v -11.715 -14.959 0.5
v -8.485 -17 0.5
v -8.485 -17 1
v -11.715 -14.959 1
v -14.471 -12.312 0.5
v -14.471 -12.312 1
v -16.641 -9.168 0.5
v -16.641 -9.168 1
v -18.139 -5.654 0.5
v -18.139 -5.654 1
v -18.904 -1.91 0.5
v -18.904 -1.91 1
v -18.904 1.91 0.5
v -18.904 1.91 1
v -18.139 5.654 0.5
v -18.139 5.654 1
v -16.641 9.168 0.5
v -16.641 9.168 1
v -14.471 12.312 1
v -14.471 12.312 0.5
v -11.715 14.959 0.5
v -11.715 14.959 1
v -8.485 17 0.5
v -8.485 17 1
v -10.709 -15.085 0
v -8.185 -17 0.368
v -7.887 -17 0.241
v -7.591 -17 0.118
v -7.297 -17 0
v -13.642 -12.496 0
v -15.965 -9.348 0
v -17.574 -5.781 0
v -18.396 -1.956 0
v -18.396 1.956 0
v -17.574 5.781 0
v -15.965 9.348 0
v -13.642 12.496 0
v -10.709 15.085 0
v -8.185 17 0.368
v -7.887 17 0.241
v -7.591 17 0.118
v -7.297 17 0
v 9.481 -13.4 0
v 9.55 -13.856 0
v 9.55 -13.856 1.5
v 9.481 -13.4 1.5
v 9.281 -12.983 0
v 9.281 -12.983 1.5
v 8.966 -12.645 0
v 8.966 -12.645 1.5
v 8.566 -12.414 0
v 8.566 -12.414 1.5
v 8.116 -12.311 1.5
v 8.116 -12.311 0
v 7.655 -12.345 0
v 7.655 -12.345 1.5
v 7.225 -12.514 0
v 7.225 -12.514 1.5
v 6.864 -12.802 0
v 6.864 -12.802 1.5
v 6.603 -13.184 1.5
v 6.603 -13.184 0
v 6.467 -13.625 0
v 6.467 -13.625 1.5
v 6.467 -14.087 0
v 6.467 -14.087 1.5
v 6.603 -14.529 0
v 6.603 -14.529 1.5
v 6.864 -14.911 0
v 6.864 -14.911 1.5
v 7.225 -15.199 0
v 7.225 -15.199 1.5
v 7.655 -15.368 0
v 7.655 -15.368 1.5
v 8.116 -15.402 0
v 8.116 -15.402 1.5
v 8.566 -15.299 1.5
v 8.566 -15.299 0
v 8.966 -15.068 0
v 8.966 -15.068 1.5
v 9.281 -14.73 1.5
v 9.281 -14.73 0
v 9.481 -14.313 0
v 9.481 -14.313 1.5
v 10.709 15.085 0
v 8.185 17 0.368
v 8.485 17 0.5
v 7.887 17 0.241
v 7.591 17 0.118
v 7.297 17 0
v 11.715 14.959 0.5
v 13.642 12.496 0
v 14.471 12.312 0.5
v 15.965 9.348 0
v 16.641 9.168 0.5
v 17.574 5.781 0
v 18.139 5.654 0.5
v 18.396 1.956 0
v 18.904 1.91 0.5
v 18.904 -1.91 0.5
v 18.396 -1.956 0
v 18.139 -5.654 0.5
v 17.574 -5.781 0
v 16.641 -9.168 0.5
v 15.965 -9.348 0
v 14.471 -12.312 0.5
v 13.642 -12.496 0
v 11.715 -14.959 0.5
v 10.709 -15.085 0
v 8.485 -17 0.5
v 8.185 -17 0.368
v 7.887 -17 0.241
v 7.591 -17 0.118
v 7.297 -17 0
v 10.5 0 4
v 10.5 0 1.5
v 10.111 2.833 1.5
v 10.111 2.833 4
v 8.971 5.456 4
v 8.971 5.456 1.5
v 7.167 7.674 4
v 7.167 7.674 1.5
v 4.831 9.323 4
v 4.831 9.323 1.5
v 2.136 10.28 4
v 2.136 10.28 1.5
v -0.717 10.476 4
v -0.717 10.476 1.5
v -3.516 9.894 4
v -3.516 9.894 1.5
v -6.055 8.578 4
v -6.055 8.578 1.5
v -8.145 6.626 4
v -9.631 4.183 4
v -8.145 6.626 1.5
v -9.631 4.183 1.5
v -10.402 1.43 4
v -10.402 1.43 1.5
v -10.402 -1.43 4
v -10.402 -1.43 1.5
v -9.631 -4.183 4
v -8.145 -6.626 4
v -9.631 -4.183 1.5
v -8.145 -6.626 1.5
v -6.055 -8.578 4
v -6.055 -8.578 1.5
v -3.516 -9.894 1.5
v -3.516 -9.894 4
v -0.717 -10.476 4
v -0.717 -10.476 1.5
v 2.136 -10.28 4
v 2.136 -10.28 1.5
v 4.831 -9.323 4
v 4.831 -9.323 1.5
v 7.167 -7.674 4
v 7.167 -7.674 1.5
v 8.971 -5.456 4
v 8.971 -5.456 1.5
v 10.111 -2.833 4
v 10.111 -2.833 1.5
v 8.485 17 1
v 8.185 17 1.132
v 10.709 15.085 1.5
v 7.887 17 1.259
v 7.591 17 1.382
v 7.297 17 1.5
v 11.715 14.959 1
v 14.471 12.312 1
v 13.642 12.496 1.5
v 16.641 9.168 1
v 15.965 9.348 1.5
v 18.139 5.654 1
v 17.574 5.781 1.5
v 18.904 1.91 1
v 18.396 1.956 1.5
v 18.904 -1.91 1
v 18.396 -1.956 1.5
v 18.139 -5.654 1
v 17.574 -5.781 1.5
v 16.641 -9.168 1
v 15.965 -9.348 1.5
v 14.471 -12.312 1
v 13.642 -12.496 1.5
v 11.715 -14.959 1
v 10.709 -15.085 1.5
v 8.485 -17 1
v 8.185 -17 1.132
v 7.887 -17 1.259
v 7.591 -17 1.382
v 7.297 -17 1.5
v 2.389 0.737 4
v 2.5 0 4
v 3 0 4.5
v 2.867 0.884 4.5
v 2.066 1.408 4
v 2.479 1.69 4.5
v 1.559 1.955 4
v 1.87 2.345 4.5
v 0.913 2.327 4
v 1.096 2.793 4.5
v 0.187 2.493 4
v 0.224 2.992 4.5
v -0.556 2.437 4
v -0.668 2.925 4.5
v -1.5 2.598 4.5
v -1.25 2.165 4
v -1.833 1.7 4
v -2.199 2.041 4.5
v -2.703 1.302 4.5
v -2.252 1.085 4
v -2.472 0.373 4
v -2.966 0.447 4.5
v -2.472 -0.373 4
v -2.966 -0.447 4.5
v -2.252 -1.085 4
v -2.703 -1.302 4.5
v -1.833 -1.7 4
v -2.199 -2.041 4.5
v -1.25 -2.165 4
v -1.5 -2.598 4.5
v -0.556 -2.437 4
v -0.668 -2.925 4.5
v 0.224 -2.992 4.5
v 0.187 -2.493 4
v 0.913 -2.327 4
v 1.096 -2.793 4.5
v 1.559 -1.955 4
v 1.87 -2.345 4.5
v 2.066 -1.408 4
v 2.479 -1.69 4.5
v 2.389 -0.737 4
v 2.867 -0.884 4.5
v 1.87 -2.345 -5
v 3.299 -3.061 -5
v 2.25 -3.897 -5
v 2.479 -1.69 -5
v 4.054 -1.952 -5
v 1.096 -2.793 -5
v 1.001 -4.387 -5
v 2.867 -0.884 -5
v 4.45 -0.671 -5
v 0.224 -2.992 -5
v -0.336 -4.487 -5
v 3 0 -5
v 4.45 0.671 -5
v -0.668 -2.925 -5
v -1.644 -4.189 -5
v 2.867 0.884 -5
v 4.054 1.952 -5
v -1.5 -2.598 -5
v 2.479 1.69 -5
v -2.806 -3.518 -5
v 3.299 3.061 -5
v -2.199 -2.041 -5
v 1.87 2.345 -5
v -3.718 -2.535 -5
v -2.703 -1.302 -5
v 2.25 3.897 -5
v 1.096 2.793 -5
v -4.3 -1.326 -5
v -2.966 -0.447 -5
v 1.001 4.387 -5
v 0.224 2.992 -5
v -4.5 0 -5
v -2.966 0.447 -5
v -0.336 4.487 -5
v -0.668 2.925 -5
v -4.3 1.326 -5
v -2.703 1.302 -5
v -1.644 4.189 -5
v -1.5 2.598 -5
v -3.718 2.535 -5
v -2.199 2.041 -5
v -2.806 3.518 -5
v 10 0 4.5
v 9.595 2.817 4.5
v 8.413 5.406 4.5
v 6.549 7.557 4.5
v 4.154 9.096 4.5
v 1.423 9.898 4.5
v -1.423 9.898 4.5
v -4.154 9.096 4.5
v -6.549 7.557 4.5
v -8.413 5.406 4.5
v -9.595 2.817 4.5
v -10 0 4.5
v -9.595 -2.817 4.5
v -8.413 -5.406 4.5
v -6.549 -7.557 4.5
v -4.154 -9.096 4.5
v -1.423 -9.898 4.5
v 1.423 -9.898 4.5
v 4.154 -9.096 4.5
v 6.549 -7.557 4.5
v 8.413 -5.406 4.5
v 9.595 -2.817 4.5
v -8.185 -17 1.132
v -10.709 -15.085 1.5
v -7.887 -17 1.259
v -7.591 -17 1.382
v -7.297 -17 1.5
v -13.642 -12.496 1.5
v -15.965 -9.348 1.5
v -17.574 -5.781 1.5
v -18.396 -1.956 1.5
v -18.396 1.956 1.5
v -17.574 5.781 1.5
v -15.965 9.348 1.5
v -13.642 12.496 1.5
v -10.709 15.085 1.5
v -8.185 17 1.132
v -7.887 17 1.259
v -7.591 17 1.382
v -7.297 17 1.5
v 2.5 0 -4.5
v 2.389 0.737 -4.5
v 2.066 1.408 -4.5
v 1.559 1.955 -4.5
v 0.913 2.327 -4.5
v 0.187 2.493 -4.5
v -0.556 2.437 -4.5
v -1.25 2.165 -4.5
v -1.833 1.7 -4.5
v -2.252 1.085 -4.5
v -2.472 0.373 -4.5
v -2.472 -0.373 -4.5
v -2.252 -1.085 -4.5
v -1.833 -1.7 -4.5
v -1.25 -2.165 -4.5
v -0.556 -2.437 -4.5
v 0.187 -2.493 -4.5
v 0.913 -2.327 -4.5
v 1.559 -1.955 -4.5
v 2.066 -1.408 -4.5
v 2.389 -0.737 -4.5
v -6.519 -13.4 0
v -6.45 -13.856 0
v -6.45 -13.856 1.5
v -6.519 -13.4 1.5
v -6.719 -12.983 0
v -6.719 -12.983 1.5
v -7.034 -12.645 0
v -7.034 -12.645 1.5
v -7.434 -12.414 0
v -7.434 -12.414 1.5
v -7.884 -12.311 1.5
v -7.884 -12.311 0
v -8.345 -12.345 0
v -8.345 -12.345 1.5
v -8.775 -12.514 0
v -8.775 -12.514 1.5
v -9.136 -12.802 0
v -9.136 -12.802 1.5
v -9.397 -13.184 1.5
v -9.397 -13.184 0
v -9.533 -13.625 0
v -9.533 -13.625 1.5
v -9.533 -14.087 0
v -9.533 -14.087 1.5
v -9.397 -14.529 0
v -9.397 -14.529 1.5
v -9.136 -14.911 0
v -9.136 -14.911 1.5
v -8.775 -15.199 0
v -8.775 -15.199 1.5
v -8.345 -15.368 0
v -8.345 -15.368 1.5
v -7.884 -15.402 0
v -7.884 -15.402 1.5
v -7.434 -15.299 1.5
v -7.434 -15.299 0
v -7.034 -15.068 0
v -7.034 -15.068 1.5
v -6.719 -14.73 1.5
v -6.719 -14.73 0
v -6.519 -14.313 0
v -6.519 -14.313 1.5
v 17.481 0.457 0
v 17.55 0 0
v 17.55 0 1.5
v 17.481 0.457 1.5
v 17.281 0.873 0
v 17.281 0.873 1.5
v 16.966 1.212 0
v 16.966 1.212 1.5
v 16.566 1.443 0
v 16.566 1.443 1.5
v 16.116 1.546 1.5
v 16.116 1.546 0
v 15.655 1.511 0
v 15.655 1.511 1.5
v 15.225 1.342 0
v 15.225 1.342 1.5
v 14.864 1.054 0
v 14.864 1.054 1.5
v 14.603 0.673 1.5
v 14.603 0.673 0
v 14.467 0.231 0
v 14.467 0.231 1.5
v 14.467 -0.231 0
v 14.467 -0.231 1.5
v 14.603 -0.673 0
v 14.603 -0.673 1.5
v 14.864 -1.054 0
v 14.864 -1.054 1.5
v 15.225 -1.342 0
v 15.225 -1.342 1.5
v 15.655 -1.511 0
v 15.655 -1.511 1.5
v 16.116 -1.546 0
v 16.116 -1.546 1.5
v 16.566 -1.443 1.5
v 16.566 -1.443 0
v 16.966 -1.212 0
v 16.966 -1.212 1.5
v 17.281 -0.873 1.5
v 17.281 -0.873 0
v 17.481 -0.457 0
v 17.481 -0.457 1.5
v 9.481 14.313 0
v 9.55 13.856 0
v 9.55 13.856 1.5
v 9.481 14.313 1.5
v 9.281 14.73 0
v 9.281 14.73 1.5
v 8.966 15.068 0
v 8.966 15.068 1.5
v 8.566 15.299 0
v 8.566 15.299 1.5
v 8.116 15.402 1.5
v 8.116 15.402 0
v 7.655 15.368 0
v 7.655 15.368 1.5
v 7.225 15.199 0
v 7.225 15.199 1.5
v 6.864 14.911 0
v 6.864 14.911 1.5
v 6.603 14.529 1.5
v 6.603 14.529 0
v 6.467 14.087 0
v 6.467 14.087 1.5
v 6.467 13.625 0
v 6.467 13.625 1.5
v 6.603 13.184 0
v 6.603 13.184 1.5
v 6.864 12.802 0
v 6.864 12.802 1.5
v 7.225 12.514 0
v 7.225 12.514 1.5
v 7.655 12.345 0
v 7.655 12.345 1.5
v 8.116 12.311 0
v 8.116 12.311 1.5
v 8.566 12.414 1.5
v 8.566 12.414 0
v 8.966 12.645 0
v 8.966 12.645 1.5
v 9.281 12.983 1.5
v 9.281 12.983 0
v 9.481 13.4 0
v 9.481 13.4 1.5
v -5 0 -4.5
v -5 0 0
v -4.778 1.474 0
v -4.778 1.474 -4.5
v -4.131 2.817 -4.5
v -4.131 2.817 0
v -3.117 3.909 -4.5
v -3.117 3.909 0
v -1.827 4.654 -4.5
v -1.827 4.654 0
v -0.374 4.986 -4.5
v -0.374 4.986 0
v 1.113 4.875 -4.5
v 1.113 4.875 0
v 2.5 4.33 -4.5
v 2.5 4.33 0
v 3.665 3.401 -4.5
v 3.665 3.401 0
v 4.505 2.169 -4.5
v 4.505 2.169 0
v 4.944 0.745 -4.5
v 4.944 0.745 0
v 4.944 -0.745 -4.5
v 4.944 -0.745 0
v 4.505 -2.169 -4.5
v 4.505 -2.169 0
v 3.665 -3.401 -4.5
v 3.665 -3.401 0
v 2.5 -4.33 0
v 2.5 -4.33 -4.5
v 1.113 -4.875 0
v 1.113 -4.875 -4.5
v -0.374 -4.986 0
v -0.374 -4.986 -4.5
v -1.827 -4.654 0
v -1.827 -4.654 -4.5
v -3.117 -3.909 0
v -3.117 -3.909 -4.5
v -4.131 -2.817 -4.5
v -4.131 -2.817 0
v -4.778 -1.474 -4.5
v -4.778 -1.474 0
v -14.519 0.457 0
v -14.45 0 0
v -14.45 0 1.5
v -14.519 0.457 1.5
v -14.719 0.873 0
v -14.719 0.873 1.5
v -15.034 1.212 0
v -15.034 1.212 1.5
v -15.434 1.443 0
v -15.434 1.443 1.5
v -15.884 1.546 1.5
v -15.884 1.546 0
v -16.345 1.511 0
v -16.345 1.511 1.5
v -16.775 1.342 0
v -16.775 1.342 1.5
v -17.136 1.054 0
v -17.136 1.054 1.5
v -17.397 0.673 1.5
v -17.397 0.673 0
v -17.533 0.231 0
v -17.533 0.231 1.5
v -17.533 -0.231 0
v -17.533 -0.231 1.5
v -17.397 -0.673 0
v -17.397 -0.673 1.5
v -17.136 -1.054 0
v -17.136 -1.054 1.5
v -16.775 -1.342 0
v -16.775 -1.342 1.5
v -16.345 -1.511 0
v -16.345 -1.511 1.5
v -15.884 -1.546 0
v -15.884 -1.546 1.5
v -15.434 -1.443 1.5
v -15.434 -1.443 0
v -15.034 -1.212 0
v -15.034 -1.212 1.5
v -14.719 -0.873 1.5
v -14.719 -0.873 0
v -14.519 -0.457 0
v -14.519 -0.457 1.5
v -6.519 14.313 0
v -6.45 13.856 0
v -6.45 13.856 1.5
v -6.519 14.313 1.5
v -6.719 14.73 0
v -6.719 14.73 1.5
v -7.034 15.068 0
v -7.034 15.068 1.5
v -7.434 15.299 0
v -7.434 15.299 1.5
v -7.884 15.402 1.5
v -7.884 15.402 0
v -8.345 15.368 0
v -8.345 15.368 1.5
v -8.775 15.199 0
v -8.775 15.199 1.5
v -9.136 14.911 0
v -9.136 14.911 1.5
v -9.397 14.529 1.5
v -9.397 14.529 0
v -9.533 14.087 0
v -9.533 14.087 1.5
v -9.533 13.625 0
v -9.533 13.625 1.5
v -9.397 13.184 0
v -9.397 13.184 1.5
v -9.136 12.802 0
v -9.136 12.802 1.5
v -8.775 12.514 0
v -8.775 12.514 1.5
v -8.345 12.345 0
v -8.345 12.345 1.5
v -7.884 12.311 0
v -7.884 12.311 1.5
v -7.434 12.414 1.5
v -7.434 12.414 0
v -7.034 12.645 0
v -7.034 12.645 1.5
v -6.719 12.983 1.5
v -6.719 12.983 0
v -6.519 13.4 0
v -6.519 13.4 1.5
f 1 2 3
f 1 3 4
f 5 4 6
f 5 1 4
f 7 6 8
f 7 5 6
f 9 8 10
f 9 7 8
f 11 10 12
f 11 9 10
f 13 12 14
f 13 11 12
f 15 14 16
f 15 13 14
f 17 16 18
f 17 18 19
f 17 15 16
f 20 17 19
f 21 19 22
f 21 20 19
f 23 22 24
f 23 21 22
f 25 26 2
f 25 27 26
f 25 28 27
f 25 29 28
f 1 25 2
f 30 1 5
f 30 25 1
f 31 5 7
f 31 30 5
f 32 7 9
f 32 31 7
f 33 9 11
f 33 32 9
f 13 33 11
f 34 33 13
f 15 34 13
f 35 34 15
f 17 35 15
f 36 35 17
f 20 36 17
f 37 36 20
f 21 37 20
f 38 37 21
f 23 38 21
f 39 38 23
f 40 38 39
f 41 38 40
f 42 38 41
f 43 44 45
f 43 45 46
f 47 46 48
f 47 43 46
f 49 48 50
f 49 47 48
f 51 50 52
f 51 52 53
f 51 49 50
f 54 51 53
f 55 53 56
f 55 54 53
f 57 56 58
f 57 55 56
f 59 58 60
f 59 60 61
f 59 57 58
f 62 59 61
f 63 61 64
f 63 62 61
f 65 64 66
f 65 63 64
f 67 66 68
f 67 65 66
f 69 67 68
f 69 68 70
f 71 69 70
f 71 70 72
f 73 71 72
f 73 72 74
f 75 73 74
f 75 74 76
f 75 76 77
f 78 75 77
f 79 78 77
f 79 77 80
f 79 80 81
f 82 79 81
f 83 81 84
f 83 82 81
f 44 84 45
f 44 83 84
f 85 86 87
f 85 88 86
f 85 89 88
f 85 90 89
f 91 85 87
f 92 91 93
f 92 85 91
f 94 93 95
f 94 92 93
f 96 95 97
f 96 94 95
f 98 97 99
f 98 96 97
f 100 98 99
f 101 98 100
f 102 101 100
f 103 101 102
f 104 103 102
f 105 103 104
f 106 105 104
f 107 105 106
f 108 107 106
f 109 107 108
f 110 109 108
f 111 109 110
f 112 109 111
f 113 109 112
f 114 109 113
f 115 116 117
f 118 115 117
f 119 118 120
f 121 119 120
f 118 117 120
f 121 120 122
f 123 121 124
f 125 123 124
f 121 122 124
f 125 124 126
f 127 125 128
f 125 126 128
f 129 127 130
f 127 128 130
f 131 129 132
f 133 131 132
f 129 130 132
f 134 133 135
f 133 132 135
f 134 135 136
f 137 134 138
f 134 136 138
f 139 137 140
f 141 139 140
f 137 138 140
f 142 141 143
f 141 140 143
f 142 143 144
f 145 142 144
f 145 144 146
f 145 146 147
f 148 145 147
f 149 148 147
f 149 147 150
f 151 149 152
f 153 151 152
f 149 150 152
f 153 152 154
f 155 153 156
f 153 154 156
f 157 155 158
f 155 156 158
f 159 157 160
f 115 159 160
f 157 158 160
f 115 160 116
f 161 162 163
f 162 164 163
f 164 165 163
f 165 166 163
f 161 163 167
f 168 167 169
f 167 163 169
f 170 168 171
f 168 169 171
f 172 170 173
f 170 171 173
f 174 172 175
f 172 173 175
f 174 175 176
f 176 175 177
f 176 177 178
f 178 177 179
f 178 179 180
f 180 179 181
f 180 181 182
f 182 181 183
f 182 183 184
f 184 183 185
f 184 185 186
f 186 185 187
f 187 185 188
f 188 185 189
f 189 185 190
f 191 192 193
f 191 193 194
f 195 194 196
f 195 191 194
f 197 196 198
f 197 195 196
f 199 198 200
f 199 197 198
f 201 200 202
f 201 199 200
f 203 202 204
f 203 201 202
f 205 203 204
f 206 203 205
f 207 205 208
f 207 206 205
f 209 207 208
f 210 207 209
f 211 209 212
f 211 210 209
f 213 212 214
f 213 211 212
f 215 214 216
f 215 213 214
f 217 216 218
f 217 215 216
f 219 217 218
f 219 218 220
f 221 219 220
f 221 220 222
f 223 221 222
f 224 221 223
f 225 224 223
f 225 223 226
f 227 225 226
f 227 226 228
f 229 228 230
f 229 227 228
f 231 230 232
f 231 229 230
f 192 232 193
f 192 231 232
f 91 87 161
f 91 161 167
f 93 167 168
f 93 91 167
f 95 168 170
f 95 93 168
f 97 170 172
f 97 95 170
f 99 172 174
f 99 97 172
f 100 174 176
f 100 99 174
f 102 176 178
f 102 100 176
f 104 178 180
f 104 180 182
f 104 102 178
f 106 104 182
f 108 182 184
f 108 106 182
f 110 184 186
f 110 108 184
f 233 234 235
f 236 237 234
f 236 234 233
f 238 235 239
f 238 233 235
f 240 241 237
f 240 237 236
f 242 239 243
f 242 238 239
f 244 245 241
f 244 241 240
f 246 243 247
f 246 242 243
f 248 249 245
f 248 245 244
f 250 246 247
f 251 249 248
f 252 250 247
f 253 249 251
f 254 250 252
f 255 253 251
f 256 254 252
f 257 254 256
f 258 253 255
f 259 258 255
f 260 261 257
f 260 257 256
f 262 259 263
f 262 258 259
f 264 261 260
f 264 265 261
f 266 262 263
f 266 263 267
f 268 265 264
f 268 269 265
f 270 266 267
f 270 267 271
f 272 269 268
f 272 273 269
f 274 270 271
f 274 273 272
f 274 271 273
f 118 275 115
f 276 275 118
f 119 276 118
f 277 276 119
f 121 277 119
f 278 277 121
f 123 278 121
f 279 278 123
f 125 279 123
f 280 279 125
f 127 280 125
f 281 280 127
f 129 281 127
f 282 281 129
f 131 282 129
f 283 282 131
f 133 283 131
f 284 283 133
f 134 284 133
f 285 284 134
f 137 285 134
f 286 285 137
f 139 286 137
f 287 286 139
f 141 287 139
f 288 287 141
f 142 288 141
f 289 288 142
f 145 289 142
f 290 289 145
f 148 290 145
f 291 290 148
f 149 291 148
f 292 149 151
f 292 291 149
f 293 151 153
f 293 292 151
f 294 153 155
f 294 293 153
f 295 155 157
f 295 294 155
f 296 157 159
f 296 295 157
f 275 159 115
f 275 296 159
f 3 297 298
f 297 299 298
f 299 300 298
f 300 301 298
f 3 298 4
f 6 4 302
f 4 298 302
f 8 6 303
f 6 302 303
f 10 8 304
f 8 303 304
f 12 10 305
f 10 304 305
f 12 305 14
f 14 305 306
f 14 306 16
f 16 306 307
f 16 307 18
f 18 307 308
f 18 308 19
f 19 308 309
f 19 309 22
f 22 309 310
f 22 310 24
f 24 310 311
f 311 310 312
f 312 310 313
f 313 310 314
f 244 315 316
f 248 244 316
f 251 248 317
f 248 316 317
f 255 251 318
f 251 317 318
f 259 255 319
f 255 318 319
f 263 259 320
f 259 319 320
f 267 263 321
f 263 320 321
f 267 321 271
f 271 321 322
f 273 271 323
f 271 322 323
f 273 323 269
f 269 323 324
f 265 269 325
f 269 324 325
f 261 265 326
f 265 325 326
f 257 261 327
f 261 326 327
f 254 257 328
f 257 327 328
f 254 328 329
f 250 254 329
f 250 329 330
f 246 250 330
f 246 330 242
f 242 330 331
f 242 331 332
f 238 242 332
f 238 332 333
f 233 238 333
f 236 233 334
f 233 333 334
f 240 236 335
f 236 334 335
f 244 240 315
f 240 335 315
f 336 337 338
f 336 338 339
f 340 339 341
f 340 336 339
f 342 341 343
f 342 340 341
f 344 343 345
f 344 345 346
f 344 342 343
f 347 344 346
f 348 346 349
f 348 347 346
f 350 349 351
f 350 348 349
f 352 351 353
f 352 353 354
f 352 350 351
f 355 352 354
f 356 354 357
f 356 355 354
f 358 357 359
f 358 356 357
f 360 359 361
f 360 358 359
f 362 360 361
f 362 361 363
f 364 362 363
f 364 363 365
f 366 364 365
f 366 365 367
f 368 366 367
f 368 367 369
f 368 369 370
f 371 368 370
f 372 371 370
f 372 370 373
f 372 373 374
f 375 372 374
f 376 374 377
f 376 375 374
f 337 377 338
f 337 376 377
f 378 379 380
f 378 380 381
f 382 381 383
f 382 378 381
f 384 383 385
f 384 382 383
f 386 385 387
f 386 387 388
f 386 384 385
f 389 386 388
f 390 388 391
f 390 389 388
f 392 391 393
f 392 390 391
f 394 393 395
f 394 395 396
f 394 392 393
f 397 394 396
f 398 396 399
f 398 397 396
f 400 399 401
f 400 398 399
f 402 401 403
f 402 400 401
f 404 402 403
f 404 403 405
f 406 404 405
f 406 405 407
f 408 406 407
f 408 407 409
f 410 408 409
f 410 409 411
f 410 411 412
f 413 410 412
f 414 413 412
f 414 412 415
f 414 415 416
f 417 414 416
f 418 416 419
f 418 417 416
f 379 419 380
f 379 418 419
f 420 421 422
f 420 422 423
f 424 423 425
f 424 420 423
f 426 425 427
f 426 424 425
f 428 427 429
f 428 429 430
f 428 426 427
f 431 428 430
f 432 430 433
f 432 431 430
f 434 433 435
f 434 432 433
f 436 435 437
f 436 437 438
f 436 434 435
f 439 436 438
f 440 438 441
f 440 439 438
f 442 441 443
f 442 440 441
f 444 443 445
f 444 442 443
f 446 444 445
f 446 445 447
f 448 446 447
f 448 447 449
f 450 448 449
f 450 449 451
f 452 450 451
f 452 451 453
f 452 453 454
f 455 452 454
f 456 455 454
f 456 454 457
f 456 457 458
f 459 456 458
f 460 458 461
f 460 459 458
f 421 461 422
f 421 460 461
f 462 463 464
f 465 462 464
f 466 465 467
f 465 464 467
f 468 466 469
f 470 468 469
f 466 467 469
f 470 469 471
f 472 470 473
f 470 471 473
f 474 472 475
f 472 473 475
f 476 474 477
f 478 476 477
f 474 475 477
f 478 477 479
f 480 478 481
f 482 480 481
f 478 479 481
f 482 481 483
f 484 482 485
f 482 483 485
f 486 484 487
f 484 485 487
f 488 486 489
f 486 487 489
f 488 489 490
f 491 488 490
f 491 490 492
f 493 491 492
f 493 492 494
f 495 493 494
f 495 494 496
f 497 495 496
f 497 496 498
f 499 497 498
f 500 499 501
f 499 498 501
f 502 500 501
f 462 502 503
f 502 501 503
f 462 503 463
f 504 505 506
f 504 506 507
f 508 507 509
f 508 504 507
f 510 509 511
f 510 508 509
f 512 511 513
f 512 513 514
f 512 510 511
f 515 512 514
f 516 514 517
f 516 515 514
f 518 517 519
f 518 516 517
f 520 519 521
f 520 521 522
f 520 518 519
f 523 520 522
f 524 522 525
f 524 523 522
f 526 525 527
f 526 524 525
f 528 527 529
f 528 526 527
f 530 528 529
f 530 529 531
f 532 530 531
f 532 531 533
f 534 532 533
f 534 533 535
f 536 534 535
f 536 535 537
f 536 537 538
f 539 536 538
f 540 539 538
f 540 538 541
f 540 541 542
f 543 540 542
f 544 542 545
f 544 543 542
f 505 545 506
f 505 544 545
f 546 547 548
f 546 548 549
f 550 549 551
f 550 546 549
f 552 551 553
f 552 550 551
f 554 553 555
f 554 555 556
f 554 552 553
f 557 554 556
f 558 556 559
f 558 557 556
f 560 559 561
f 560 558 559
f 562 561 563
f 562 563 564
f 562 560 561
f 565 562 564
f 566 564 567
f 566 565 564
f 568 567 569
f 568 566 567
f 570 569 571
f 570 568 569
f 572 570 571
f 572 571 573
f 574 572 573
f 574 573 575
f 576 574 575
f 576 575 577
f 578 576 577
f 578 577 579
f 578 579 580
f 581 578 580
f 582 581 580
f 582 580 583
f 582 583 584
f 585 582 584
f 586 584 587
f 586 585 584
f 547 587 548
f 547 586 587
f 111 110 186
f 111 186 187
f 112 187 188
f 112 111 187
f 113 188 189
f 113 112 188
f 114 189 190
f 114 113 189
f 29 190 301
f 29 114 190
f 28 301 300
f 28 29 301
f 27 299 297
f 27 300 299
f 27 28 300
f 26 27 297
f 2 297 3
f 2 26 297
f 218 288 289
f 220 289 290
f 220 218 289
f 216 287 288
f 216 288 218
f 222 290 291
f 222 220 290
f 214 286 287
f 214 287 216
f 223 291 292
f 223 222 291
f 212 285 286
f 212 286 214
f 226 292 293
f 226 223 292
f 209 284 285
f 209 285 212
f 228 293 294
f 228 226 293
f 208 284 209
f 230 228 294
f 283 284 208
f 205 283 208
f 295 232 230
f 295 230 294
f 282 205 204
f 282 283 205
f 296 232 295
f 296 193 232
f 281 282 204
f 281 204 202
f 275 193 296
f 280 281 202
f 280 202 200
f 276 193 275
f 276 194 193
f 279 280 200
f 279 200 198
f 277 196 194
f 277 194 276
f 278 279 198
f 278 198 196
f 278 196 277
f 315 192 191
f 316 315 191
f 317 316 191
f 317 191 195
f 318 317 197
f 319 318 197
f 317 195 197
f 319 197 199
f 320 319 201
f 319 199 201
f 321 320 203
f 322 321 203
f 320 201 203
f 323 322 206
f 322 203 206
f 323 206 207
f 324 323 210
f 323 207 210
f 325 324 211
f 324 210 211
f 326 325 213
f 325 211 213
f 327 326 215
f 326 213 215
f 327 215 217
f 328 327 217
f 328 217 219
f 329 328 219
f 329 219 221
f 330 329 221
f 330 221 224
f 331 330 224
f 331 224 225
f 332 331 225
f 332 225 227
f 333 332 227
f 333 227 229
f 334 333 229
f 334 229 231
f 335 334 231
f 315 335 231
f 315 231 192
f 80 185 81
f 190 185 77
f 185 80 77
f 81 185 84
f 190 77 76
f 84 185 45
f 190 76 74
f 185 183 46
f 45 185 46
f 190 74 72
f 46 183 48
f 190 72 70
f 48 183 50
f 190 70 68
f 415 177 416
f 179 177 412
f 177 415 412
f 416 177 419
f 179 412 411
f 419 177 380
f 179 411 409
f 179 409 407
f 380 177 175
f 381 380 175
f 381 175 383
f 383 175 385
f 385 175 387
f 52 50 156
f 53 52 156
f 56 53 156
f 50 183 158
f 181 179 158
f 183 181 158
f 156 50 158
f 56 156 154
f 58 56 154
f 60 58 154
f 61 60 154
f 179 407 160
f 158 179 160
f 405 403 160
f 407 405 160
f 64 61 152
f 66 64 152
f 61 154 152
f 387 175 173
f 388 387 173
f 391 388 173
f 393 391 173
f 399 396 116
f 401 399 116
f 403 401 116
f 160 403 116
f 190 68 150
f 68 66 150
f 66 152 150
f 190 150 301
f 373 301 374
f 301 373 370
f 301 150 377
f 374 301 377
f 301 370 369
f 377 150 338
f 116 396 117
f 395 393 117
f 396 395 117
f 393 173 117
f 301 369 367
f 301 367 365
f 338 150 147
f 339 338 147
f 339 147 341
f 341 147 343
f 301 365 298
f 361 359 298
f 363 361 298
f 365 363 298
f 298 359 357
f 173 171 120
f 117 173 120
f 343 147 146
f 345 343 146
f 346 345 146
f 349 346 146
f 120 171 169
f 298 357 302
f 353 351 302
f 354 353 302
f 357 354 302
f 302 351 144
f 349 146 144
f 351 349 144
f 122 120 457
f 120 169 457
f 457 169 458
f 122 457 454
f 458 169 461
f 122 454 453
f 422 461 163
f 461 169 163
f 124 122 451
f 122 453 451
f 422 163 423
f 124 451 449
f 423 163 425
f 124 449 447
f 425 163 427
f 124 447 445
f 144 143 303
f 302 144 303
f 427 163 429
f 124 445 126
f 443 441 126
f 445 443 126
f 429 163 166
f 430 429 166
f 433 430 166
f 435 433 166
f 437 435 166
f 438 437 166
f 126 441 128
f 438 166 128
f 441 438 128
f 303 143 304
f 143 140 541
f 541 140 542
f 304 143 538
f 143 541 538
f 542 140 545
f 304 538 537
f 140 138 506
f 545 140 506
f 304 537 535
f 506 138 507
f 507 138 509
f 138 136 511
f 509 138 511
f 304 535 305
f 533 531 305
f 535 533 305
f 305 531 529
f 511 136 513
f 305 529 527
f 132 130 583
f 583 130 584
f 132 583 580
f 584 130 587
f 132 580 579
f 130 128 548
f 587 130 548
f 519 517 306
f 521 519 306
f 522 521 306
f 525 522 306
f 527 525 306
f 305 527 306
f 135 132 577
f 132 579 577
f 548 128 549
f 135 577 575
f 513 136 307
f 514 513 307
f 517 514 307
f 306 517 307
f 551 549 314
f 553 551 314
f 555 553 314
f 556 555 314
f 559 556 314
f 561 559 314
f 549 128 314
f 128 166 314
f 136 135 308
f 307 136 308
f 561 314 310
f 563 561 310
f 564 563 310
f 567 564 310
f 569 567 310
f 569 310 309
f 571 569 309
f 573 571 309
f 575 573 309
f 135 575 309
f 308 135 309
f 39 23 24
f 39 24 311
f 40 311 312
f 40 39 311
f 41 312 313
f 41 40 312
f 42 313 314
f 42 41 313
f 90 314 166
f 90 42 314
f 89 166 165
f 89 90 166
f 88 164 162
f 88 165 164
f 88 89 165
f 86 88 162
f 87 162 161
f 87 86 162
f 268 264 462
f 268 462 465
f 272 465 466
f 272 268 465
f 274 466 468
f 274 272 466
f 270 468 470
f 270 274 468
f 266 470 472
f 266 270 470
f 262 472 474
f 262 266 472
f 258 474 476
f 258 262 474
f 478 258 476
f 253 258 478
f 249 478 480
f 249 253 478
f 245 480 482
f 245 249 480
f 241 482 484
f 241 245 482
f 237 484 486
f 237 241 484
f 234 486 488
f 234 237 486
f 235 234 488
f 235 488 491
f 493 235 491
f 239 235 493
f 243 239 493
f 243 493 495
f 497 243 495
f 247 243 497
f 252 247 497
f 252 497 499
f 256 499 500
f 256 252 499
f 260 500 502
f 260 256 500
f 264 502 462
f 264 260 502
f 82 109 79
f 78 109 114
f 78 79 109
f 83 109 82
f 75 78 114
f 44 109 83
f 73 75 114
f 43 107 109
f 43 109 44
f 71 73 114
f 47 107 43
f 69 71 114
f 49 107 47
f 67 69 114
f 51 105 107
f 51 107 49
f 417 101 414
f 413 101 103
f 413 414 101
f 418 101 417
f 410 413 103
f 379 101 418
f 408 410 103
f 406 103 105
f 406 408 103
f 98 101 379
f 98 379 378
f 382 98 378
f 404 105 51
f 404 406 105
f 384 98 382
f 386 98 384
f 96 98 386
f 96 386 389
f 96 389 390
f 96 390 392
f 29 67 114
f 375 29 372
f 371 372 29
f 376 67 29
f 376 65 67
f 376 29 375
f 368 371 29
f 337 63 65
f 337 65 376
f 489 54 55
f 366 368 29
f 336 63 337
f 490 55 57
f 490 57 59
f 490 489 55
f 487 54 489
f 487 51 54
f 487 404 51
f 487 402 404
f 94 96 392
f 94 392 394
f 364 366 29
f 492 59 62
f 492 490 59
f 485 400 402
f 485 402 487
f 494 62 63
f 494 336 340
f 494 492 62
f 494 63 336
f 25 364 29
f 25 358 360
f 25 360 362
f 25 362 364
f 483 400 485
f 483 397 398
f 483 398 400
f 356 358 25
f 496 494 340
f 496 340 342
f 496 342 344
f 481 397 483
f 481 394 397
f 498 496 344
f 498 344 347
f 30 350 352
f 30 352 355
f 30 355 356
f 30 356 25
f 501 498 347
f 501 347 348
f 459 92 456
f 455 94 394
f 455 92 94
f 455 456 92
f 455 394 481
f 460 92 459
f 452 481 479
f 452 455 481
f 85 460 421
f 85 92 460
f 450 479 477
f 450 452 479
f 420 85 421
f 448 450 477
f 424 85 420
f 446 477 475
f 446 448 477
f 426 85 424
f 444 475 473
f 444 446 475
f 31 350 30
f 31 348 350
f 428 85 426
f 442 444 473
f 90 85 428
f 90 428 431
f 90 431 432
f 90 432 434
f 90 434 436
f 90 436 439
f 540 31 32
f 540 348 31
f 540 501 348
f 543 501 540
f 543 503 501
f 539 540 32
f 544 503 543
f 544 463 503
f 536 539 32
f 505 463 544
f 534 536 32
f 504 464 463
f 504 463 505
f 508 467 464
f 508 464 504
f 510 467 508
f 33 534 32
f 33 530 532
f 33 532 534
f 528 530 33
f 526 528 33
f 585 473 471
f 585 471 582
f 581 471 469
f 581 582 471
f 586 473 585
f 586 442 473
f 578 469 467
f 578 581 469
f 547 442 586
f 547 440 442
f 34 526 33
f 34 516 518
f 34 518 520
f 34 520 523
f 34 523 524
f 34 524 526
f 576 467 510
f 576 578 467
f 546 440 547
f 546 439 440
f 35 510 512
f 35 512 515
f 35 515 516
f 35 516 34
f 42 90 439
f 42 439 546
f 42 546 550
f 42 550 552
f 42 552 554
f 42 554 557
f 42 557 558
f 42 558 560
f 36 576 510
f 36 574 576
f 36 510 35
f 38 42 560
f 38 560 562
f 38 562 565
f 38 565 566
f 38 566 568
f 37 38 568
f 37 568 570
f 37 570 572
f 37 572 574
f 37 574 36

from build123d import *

# Parameters (mm, degrees)
SKETCH2_R           = 1.55
BOSS_EXTRUDE1_DEPTH = 1.5
SKETCH3_R           = 10.5
BOSS_EXTRUDE2_DEPTH = 3
SKETCH4_R           = 5
BOSS_EXTRUDE3_DEPTH = 5
SKETCH5_R           = 2.5
CUT_EXTRUDE1_DEPTH  = 28.207535721
CHAMFER1_SIZE       = 0.5


with BuildPart() as part:
    # Sketch2 → Boss-Extrude1 (new body)
    with BuildSketch(Plane.XY):
        with BuildLine():
            Line((-8.485281374, 17), (8.485281374, 17))
            ThreePointArc((8.485281374, 17), (19, 0), (8.485281374, -17))
            Line((8.485281374, -17), (-8.485281374, -17))
            ThreePointArc((-8.485281374, -17), (-19, 0), (-8.485281374, 17))
        make_face()
        with Locations((-16, 0)):
            Circle(SKETCH2_R, mode=Mode.SUBTRACT)
        with Locations((-8, 13.856406461)):
            Circle(SKETCH2_R, mode=Mode.SUBTRACT)
        with Locations((8, 13.856406461)):
            Circle(SKETCH2_R, mode=Mode.SUBTRACT)
        with Locations((16, 0)):
            Circle(SKETCH2_R, mode=Mode.SUBTRACT)
        with Locations((8, -13.856406461)):
            Circle(SKETCH2_R, mode=Mode.SUBTRACT)
        with Locations((-8, -13.856406461)):
            Circle(SKETCH2_R, mode=Mode.SUBTRACT)
    extrude(amount=BOSS_EXTRUDE1_DEPTH)

    # Sketch3 → Boss-Extrude2 (add)
    with BuildSketch(Plane.XY.offset(1.5)):
        Circle(SKETCH3_R)
    extrude(amount=BOSS_EXTRUDE2_DEPTH)

    # Sketch4 → Boss-Extrude3 (add)
    with BuildSketch(Plane(origin=(0, 0, 0), x_dir=(-1, 0, 0), z_dir=(0, 0, -1))):
        Circle(SKETCH4_R)
    extrude(amount=BOSS_EXTRUDE3_DEPTH)

    # Sketch5 → Cut-Extrude1 (cut, through all)
    with BuildSketch(Plane.XY.offset(4.5)):
        Circle(SKETCH5_R)
    extrude(amount=-CUT_EXTRUDE1_DEPTH, mode=Mode.SUBTRACT)

    # Chamfer1
    chamfer1_edges = [part.edges().sort_by_distance(p)[0] for p in [
        (-19, 0, 1.5),
        (-10.5, 0, 4.5),
        (5, 0, -5),
        (19, 0, 1.5),
        (-2.5, 0, -5),
        (-2.5, 0, 4.5),
        (-19, 0, 0),
        (19, 0, 0),
    ]]
    chamfer(chamfer1_edges, length=CHAMFER1_SIZE)


solid = part.part
